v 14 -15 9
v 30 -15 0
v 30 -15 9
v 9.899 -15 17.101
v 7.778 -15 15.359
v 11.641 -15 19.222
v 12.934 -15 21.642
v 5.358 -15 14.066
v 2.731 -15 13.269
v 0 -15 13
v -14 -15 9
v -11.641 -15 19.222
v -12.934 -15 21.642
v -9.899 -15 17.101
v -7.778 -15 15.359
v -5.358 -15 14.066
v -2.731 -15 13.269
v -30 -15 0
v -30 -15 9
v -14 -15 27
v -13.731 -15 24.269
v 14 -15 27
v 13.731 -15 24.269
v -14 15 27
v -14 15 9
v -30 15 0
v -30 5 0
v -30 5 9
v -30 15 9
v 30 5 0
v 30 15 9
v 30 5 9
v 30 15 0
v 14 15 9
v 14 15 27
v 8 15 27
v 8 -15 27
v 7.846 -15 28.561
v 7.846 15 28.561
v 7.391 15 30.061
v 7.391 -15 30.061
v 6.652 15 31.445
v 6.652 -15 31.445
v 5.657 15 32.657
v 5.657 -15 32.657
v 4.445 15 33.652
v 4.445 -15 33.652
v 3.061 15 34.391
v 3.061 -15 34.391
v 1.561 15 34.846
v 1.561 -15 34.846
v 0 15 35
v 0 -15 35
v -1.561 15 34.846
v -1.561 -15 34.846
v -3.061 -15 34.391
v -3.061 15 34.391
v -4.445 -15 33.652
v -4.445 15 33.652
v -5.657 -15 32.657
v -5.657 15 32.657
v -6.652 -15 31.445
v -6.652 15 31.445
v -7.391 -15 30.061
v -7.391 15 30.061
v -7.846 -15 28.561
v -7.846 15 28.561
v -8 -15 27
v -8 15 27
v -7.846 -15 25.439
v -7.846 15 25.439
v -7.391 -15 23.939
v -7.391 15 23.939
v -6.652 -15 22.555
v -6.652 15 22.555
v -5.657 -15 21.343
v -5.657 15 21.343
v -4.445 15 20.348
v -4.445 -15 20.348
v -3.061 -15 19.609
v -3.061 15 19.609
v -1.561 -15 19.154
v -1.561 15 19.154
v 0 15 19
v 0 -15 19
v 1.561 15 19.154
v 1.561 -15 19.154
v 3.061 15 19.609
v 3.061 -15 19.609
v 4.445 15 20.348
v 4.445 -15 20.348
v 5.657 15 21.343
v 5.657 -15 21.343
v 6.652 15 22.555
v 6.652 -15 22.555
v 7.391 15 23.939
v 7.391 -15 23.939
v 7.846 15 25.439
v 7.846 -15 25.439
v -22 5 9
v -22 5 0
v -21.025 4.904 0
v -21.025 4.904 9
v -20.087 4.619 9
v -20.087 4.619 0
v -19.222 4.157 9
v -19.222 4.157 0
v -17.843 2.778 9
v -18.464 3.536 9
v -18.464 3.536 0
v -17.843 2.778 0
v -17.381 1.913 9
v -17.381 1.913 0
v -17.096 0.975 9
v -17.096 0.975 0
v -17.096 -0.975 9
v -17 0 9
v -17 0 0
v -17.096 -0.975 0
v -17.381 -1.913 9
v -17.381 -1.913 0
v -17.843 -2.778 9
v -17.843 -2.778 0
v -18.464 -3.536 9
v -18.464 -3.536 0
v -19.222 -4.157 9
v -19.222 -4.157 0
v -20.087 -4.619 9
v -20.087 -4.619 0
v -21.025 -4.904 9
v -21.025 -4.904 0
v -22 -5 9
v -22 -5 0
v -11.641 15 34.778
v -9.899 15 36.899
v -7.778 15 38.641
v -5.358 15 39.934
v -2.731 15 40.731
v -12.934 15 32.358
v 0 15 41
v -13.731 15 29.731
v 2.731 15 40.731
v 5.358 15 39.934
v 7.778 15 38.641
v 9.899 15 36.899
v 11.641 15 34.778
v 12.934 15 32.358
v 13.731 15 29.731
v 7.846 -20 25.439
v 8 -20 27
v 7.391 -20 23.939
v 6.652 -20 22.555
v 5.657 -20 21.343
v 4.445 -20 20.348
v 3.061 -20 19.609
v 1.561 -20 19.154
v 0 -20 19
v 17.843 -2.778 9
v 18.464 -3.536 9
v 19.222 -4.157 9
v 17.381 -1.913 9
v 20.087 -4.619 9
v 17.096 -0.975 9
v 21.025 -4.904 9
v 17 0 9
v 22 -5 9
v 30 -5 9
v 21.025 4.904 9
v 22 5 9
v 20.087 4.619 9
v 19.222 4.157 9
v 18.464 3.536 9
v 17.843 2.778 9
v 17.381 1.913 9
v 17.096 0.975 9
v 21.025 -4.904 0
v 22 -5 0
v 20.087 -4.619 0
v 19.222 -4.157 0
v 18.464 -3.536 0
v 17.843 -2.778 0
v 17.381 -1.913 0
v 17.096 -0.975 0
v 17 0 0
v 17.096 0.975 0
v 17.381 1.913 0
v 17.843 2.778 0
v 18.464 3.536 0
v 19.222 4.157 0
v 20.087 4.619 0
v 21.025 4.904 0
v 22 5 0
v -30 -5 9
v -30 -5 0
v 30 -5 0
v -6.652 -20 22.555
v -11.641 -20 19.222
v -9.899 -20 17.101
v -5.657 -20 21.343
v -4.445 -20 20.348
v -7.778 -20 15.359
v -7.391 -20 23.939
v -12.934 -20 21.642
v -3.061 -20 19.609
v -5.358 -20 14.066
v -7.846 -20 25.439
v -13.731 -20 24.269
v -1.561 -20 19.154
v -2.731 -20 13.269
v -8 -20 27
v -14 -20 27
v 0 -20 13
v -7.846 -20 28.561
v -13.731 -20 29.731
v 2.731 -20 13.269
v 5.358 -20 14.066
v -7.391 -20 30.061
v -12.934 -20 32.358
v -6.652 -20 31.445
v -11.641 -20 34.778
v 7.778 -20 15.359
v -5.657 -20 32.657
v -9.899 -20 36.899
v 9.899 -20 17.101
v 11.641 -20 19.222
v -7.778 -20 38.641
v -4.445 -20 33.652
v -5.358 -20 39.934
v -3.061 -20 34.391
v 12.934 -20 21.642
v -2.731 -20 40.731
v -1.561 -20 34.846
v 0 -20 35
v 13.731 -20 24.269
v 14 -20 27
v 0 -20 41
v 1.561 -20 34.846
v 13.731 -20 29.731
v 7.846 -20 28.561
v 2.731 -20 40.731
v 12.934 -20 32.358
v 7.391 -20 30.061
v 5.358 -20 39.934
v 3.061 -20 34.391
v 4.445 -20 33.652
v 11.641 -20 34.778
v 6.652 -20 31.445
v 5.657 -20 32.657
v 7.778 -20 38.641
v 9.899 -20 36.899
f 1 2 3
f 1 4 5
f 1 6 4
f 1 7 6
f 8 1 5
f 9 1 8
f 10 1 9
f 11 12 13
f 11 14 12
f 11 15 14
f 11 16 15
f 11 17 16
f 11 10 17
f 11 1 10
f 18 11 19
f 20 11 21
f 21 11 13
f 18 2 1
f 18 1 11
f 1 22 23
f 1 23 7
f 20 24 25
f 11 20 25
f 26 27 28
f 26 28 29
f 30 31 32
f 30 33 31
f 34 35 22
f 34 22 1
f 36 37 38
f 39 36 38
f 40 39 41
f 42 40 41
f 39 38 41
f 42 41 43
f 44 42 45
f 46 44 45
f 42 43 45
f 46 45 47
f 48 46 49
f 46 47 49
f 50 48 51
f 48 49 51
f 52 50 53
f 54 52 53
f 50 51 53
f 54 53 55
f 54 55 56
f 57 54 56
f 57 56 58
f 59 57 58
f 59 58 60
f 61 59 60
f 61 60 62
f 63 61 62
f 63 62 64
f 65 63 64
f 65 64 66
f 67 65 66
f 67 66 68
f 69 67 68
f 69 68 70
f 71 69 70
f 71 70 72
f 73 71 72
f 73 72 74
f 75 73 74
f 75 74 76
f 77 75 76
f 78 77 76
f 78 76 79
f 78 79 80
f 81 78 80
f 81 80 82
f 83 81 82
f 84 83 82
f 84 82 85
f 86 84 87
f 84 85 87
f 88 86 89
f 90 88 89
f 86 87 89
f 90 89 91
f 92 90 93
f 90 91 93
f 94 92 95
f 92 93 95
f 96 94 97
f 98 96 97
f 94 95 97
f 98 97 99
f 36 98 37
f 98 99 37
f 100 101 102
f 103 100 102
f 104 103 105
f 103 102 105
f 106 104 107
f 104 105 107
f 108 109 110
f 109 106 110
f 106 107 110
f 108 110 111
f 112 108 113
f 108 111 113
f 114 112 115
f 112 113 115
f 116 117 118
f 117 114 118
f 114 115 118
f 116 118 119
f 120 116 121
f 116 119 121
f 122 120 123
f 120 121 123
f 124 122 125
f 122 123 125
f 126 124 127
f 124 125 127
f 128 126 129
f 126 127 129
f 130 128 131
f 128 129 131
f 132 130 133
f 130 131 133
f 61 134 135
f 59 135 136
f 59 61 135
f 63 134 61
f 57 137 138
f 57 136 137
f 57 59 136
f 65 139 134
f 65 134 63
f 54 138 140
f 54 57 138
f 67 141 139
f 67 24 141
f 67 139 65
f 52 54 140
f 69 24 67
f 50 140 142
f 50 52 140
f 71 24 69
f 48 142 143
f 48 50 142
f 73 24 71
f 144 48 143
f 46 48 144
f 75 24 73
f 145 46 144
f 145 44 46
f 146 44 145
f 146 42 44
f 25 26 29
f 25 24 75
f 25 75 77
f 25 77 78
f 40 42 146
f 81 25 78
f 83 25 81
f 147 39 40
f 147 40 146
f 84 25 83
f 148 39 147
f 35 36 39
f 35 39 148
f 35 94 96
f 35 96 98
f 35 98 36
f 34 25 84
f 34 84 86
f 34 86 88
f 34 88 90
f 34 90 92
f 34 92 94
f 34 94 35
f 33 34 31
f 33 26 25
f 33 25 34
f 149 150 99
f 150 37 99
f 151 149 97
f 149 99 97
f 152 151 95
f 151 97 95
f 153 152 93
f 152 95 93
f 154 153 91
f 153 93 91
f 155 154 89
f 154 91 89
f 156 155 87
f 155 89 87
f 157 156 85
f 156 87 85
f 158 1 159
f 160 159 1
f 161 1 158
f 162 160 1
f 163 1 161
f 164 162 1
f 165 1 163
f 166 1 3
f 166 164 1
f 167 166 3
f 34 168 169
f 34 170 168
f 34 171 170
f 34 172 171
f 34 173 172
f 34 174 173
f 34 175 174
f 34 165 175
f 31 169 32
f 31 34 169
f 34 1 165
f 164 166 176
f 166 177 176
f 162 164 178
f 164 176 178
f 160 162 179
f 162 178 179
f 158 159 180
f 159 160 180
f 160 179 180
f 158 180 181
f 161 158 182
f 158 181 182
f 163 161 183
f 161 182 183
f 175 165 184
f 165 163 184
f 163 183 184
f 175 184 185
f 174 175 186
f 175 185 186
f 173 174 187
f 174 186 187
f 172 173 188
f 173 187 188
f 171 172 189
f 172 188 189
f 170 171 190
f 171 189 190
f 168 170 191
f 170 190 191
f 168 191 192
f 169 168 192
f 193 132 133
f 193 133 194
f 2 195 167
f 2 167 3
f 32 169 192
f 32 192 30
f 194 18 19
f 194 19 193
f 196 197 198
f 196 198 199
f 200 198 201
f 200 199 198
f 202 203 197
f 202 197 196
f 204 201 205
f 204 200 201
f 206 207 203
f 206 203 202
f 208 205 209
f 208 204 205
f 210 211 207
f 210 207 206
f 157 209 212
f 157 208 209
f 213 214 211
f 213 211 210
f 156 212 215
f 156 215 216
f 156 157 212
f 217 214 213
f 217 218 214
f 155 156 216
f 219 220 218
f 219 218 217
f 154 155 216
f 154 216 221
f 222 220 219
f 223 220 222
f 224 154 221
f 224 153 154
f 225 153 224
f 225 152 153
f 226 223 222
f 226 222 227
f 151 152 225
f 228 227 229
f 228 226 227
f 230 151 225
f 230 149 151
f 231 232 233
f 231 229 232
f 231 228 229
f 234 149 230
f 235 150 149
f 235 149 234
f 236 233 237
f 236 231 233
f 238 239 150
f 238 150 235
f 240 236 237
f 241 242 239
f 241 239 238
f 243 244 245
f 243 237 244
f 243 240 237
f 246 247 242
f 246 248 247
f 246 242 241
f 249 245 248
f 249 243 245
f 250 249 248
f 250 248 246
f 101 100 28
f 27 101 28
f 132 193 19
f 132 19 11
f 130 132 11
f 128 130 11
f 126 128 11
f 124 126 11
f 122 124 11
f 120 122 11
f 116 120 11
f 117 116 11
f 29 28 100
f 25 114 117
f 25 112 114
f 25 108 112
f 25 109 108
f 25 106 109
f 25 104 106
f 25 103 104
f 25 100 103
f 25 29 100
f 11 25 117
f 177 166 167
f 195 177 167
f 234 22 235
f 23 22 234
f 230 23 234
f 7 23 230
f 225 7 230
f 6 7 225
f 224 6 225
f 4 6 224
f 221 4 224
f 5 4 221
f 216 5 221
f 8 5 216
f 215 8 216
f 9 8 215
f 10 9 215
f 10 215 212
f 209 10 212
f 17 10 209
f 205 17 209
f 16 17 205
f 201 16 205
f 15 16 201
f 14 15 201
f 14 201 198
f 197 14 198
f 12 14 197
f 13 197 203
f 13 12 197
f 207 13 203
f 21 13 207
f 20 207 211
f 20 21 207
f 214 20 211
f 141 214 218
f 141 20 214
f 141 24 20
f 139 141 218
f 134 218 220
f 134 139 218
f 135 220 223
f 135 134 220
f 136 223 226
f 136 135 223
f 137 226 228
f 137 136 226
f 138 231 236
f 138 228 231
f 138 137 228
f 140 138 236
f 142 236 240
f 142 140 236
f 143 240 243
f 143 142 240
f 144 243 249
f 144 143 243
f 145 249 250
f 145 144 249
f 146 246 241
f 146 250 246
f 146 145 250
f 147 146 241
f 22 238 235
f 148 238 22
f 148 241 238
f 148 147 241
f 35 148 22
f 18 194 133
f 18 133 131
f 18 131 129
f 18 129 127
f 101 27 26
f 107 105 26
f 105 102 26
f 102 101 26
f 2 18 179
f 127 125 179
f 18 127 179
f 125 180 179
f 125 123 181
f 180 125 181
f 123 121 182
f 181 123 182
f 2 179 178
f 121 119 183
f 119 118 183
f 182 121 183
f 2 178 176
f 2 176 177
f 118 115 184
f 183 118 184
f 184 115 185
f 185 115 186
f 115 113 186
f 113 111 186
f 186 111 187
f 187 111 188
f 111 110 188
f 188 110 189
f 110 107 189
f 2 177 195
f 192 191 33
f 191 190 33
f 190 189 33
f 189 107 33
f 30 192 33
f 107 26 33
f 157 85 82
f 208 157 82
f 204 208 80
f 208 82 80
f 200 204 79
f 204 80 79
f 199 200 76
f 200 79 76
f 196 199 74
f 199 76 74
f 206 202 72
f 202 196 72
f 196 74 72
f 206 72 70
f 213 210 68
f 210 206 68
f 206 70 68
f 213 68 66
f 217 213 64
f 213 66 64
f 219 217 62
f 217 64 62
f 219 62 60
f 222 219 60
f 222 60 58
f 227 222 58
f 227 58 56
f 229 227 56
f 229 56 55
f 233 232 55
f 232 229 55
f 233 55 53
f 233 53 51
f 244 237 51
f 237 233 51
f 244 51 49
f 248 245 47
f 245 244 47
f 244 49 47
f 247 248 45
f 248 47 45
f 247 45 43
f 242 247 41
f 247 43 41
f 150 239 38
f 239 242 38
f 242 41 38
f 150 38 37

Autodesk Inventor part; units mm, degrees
ref_plane "YZ Plane" through (0, 0, 0) normal (1, 0, 0) x (0, 1, 0)
ref_plane "XZ Plane" through (0, 0, 0) normal (0, 1, 0) x (-1, 0, 0)
ref_plane "XY Plane" through (0, 0, 0) normal (0, 0, 1) x (1, 0, 0)
sketch "草图1" plane through (0, 0, 0) normal (0, 0, 1) x (1, 0, 0)
  line L0 (-30, 15) -> (30, 15)
  line L1 (30, -15) -> (-30, -15)
  line L2 (-30, 15) -> (30, -15) construction
  line L3 (30, 15) -> (-30, -15) construction
  arc A0 (-22, -5) -> (-22, 5) centre (-22, 0) ccw
  line L4 (-22, 5) -> (-30, 5)
  line L5 (-22, -5) -> (-30, -5)
  line L6 (-30, -15) -> (-30, -5)
  line L7 (-30, 5) -> (-30, 15)
  arc A1 (22, 5) -> (22, -5) centre (22, 0) ccw
  line L8 (22, 5) -> (30, 5)
  line L9 (22, -5) -> (30, -5)
  line L10 (30, 15) -> (30, 5)
  line L11 (30, -5) -> (30, -15)
  point P0 (0, 0)
  dimension "d0" = 60
  dimension "d1" = 30
  dimension "d3" = 10
  dimension "d5" = 10
extrude "拉伸1" add sketch "草图1" along normal blind 9
sketch "草图2" plane through (-30, -15, 0) normal (0, -1, 0) x (1, 0, 0)
  line L0 (30, 0) -> (30, 27)
  circle A0 centre (30, 27) radius 8
  circle A1 centre (30, 27) radius 14
  line L1 (60, 9) -> (0, 9) projected
  line L2 (44, 27) -> (44, 9)
  line L3 (16, 27) -> (16, 9)
  dimension "d8" = 27
  dimension "d9" = 16
  dimension "d10" = 28
extrude "拉伸2" add sketch "草图2" against normal blind 30
sketch "草图3" plane through (-30, -15, 0) normal (0, -1, 0) x (1, 0, 0)
  line L0 (30, 0) -> (30, 27)
  circle A0 centre (30, 27) radius 14
  circle A1 centre (30, 27) radius 8
  dimension "d13" = 27
  dimension "d14" = 28
  dimension "d15" = 16
extrude "拉伸3" add sketch "草图3" along normal blind 5
properties part number "2-5"
